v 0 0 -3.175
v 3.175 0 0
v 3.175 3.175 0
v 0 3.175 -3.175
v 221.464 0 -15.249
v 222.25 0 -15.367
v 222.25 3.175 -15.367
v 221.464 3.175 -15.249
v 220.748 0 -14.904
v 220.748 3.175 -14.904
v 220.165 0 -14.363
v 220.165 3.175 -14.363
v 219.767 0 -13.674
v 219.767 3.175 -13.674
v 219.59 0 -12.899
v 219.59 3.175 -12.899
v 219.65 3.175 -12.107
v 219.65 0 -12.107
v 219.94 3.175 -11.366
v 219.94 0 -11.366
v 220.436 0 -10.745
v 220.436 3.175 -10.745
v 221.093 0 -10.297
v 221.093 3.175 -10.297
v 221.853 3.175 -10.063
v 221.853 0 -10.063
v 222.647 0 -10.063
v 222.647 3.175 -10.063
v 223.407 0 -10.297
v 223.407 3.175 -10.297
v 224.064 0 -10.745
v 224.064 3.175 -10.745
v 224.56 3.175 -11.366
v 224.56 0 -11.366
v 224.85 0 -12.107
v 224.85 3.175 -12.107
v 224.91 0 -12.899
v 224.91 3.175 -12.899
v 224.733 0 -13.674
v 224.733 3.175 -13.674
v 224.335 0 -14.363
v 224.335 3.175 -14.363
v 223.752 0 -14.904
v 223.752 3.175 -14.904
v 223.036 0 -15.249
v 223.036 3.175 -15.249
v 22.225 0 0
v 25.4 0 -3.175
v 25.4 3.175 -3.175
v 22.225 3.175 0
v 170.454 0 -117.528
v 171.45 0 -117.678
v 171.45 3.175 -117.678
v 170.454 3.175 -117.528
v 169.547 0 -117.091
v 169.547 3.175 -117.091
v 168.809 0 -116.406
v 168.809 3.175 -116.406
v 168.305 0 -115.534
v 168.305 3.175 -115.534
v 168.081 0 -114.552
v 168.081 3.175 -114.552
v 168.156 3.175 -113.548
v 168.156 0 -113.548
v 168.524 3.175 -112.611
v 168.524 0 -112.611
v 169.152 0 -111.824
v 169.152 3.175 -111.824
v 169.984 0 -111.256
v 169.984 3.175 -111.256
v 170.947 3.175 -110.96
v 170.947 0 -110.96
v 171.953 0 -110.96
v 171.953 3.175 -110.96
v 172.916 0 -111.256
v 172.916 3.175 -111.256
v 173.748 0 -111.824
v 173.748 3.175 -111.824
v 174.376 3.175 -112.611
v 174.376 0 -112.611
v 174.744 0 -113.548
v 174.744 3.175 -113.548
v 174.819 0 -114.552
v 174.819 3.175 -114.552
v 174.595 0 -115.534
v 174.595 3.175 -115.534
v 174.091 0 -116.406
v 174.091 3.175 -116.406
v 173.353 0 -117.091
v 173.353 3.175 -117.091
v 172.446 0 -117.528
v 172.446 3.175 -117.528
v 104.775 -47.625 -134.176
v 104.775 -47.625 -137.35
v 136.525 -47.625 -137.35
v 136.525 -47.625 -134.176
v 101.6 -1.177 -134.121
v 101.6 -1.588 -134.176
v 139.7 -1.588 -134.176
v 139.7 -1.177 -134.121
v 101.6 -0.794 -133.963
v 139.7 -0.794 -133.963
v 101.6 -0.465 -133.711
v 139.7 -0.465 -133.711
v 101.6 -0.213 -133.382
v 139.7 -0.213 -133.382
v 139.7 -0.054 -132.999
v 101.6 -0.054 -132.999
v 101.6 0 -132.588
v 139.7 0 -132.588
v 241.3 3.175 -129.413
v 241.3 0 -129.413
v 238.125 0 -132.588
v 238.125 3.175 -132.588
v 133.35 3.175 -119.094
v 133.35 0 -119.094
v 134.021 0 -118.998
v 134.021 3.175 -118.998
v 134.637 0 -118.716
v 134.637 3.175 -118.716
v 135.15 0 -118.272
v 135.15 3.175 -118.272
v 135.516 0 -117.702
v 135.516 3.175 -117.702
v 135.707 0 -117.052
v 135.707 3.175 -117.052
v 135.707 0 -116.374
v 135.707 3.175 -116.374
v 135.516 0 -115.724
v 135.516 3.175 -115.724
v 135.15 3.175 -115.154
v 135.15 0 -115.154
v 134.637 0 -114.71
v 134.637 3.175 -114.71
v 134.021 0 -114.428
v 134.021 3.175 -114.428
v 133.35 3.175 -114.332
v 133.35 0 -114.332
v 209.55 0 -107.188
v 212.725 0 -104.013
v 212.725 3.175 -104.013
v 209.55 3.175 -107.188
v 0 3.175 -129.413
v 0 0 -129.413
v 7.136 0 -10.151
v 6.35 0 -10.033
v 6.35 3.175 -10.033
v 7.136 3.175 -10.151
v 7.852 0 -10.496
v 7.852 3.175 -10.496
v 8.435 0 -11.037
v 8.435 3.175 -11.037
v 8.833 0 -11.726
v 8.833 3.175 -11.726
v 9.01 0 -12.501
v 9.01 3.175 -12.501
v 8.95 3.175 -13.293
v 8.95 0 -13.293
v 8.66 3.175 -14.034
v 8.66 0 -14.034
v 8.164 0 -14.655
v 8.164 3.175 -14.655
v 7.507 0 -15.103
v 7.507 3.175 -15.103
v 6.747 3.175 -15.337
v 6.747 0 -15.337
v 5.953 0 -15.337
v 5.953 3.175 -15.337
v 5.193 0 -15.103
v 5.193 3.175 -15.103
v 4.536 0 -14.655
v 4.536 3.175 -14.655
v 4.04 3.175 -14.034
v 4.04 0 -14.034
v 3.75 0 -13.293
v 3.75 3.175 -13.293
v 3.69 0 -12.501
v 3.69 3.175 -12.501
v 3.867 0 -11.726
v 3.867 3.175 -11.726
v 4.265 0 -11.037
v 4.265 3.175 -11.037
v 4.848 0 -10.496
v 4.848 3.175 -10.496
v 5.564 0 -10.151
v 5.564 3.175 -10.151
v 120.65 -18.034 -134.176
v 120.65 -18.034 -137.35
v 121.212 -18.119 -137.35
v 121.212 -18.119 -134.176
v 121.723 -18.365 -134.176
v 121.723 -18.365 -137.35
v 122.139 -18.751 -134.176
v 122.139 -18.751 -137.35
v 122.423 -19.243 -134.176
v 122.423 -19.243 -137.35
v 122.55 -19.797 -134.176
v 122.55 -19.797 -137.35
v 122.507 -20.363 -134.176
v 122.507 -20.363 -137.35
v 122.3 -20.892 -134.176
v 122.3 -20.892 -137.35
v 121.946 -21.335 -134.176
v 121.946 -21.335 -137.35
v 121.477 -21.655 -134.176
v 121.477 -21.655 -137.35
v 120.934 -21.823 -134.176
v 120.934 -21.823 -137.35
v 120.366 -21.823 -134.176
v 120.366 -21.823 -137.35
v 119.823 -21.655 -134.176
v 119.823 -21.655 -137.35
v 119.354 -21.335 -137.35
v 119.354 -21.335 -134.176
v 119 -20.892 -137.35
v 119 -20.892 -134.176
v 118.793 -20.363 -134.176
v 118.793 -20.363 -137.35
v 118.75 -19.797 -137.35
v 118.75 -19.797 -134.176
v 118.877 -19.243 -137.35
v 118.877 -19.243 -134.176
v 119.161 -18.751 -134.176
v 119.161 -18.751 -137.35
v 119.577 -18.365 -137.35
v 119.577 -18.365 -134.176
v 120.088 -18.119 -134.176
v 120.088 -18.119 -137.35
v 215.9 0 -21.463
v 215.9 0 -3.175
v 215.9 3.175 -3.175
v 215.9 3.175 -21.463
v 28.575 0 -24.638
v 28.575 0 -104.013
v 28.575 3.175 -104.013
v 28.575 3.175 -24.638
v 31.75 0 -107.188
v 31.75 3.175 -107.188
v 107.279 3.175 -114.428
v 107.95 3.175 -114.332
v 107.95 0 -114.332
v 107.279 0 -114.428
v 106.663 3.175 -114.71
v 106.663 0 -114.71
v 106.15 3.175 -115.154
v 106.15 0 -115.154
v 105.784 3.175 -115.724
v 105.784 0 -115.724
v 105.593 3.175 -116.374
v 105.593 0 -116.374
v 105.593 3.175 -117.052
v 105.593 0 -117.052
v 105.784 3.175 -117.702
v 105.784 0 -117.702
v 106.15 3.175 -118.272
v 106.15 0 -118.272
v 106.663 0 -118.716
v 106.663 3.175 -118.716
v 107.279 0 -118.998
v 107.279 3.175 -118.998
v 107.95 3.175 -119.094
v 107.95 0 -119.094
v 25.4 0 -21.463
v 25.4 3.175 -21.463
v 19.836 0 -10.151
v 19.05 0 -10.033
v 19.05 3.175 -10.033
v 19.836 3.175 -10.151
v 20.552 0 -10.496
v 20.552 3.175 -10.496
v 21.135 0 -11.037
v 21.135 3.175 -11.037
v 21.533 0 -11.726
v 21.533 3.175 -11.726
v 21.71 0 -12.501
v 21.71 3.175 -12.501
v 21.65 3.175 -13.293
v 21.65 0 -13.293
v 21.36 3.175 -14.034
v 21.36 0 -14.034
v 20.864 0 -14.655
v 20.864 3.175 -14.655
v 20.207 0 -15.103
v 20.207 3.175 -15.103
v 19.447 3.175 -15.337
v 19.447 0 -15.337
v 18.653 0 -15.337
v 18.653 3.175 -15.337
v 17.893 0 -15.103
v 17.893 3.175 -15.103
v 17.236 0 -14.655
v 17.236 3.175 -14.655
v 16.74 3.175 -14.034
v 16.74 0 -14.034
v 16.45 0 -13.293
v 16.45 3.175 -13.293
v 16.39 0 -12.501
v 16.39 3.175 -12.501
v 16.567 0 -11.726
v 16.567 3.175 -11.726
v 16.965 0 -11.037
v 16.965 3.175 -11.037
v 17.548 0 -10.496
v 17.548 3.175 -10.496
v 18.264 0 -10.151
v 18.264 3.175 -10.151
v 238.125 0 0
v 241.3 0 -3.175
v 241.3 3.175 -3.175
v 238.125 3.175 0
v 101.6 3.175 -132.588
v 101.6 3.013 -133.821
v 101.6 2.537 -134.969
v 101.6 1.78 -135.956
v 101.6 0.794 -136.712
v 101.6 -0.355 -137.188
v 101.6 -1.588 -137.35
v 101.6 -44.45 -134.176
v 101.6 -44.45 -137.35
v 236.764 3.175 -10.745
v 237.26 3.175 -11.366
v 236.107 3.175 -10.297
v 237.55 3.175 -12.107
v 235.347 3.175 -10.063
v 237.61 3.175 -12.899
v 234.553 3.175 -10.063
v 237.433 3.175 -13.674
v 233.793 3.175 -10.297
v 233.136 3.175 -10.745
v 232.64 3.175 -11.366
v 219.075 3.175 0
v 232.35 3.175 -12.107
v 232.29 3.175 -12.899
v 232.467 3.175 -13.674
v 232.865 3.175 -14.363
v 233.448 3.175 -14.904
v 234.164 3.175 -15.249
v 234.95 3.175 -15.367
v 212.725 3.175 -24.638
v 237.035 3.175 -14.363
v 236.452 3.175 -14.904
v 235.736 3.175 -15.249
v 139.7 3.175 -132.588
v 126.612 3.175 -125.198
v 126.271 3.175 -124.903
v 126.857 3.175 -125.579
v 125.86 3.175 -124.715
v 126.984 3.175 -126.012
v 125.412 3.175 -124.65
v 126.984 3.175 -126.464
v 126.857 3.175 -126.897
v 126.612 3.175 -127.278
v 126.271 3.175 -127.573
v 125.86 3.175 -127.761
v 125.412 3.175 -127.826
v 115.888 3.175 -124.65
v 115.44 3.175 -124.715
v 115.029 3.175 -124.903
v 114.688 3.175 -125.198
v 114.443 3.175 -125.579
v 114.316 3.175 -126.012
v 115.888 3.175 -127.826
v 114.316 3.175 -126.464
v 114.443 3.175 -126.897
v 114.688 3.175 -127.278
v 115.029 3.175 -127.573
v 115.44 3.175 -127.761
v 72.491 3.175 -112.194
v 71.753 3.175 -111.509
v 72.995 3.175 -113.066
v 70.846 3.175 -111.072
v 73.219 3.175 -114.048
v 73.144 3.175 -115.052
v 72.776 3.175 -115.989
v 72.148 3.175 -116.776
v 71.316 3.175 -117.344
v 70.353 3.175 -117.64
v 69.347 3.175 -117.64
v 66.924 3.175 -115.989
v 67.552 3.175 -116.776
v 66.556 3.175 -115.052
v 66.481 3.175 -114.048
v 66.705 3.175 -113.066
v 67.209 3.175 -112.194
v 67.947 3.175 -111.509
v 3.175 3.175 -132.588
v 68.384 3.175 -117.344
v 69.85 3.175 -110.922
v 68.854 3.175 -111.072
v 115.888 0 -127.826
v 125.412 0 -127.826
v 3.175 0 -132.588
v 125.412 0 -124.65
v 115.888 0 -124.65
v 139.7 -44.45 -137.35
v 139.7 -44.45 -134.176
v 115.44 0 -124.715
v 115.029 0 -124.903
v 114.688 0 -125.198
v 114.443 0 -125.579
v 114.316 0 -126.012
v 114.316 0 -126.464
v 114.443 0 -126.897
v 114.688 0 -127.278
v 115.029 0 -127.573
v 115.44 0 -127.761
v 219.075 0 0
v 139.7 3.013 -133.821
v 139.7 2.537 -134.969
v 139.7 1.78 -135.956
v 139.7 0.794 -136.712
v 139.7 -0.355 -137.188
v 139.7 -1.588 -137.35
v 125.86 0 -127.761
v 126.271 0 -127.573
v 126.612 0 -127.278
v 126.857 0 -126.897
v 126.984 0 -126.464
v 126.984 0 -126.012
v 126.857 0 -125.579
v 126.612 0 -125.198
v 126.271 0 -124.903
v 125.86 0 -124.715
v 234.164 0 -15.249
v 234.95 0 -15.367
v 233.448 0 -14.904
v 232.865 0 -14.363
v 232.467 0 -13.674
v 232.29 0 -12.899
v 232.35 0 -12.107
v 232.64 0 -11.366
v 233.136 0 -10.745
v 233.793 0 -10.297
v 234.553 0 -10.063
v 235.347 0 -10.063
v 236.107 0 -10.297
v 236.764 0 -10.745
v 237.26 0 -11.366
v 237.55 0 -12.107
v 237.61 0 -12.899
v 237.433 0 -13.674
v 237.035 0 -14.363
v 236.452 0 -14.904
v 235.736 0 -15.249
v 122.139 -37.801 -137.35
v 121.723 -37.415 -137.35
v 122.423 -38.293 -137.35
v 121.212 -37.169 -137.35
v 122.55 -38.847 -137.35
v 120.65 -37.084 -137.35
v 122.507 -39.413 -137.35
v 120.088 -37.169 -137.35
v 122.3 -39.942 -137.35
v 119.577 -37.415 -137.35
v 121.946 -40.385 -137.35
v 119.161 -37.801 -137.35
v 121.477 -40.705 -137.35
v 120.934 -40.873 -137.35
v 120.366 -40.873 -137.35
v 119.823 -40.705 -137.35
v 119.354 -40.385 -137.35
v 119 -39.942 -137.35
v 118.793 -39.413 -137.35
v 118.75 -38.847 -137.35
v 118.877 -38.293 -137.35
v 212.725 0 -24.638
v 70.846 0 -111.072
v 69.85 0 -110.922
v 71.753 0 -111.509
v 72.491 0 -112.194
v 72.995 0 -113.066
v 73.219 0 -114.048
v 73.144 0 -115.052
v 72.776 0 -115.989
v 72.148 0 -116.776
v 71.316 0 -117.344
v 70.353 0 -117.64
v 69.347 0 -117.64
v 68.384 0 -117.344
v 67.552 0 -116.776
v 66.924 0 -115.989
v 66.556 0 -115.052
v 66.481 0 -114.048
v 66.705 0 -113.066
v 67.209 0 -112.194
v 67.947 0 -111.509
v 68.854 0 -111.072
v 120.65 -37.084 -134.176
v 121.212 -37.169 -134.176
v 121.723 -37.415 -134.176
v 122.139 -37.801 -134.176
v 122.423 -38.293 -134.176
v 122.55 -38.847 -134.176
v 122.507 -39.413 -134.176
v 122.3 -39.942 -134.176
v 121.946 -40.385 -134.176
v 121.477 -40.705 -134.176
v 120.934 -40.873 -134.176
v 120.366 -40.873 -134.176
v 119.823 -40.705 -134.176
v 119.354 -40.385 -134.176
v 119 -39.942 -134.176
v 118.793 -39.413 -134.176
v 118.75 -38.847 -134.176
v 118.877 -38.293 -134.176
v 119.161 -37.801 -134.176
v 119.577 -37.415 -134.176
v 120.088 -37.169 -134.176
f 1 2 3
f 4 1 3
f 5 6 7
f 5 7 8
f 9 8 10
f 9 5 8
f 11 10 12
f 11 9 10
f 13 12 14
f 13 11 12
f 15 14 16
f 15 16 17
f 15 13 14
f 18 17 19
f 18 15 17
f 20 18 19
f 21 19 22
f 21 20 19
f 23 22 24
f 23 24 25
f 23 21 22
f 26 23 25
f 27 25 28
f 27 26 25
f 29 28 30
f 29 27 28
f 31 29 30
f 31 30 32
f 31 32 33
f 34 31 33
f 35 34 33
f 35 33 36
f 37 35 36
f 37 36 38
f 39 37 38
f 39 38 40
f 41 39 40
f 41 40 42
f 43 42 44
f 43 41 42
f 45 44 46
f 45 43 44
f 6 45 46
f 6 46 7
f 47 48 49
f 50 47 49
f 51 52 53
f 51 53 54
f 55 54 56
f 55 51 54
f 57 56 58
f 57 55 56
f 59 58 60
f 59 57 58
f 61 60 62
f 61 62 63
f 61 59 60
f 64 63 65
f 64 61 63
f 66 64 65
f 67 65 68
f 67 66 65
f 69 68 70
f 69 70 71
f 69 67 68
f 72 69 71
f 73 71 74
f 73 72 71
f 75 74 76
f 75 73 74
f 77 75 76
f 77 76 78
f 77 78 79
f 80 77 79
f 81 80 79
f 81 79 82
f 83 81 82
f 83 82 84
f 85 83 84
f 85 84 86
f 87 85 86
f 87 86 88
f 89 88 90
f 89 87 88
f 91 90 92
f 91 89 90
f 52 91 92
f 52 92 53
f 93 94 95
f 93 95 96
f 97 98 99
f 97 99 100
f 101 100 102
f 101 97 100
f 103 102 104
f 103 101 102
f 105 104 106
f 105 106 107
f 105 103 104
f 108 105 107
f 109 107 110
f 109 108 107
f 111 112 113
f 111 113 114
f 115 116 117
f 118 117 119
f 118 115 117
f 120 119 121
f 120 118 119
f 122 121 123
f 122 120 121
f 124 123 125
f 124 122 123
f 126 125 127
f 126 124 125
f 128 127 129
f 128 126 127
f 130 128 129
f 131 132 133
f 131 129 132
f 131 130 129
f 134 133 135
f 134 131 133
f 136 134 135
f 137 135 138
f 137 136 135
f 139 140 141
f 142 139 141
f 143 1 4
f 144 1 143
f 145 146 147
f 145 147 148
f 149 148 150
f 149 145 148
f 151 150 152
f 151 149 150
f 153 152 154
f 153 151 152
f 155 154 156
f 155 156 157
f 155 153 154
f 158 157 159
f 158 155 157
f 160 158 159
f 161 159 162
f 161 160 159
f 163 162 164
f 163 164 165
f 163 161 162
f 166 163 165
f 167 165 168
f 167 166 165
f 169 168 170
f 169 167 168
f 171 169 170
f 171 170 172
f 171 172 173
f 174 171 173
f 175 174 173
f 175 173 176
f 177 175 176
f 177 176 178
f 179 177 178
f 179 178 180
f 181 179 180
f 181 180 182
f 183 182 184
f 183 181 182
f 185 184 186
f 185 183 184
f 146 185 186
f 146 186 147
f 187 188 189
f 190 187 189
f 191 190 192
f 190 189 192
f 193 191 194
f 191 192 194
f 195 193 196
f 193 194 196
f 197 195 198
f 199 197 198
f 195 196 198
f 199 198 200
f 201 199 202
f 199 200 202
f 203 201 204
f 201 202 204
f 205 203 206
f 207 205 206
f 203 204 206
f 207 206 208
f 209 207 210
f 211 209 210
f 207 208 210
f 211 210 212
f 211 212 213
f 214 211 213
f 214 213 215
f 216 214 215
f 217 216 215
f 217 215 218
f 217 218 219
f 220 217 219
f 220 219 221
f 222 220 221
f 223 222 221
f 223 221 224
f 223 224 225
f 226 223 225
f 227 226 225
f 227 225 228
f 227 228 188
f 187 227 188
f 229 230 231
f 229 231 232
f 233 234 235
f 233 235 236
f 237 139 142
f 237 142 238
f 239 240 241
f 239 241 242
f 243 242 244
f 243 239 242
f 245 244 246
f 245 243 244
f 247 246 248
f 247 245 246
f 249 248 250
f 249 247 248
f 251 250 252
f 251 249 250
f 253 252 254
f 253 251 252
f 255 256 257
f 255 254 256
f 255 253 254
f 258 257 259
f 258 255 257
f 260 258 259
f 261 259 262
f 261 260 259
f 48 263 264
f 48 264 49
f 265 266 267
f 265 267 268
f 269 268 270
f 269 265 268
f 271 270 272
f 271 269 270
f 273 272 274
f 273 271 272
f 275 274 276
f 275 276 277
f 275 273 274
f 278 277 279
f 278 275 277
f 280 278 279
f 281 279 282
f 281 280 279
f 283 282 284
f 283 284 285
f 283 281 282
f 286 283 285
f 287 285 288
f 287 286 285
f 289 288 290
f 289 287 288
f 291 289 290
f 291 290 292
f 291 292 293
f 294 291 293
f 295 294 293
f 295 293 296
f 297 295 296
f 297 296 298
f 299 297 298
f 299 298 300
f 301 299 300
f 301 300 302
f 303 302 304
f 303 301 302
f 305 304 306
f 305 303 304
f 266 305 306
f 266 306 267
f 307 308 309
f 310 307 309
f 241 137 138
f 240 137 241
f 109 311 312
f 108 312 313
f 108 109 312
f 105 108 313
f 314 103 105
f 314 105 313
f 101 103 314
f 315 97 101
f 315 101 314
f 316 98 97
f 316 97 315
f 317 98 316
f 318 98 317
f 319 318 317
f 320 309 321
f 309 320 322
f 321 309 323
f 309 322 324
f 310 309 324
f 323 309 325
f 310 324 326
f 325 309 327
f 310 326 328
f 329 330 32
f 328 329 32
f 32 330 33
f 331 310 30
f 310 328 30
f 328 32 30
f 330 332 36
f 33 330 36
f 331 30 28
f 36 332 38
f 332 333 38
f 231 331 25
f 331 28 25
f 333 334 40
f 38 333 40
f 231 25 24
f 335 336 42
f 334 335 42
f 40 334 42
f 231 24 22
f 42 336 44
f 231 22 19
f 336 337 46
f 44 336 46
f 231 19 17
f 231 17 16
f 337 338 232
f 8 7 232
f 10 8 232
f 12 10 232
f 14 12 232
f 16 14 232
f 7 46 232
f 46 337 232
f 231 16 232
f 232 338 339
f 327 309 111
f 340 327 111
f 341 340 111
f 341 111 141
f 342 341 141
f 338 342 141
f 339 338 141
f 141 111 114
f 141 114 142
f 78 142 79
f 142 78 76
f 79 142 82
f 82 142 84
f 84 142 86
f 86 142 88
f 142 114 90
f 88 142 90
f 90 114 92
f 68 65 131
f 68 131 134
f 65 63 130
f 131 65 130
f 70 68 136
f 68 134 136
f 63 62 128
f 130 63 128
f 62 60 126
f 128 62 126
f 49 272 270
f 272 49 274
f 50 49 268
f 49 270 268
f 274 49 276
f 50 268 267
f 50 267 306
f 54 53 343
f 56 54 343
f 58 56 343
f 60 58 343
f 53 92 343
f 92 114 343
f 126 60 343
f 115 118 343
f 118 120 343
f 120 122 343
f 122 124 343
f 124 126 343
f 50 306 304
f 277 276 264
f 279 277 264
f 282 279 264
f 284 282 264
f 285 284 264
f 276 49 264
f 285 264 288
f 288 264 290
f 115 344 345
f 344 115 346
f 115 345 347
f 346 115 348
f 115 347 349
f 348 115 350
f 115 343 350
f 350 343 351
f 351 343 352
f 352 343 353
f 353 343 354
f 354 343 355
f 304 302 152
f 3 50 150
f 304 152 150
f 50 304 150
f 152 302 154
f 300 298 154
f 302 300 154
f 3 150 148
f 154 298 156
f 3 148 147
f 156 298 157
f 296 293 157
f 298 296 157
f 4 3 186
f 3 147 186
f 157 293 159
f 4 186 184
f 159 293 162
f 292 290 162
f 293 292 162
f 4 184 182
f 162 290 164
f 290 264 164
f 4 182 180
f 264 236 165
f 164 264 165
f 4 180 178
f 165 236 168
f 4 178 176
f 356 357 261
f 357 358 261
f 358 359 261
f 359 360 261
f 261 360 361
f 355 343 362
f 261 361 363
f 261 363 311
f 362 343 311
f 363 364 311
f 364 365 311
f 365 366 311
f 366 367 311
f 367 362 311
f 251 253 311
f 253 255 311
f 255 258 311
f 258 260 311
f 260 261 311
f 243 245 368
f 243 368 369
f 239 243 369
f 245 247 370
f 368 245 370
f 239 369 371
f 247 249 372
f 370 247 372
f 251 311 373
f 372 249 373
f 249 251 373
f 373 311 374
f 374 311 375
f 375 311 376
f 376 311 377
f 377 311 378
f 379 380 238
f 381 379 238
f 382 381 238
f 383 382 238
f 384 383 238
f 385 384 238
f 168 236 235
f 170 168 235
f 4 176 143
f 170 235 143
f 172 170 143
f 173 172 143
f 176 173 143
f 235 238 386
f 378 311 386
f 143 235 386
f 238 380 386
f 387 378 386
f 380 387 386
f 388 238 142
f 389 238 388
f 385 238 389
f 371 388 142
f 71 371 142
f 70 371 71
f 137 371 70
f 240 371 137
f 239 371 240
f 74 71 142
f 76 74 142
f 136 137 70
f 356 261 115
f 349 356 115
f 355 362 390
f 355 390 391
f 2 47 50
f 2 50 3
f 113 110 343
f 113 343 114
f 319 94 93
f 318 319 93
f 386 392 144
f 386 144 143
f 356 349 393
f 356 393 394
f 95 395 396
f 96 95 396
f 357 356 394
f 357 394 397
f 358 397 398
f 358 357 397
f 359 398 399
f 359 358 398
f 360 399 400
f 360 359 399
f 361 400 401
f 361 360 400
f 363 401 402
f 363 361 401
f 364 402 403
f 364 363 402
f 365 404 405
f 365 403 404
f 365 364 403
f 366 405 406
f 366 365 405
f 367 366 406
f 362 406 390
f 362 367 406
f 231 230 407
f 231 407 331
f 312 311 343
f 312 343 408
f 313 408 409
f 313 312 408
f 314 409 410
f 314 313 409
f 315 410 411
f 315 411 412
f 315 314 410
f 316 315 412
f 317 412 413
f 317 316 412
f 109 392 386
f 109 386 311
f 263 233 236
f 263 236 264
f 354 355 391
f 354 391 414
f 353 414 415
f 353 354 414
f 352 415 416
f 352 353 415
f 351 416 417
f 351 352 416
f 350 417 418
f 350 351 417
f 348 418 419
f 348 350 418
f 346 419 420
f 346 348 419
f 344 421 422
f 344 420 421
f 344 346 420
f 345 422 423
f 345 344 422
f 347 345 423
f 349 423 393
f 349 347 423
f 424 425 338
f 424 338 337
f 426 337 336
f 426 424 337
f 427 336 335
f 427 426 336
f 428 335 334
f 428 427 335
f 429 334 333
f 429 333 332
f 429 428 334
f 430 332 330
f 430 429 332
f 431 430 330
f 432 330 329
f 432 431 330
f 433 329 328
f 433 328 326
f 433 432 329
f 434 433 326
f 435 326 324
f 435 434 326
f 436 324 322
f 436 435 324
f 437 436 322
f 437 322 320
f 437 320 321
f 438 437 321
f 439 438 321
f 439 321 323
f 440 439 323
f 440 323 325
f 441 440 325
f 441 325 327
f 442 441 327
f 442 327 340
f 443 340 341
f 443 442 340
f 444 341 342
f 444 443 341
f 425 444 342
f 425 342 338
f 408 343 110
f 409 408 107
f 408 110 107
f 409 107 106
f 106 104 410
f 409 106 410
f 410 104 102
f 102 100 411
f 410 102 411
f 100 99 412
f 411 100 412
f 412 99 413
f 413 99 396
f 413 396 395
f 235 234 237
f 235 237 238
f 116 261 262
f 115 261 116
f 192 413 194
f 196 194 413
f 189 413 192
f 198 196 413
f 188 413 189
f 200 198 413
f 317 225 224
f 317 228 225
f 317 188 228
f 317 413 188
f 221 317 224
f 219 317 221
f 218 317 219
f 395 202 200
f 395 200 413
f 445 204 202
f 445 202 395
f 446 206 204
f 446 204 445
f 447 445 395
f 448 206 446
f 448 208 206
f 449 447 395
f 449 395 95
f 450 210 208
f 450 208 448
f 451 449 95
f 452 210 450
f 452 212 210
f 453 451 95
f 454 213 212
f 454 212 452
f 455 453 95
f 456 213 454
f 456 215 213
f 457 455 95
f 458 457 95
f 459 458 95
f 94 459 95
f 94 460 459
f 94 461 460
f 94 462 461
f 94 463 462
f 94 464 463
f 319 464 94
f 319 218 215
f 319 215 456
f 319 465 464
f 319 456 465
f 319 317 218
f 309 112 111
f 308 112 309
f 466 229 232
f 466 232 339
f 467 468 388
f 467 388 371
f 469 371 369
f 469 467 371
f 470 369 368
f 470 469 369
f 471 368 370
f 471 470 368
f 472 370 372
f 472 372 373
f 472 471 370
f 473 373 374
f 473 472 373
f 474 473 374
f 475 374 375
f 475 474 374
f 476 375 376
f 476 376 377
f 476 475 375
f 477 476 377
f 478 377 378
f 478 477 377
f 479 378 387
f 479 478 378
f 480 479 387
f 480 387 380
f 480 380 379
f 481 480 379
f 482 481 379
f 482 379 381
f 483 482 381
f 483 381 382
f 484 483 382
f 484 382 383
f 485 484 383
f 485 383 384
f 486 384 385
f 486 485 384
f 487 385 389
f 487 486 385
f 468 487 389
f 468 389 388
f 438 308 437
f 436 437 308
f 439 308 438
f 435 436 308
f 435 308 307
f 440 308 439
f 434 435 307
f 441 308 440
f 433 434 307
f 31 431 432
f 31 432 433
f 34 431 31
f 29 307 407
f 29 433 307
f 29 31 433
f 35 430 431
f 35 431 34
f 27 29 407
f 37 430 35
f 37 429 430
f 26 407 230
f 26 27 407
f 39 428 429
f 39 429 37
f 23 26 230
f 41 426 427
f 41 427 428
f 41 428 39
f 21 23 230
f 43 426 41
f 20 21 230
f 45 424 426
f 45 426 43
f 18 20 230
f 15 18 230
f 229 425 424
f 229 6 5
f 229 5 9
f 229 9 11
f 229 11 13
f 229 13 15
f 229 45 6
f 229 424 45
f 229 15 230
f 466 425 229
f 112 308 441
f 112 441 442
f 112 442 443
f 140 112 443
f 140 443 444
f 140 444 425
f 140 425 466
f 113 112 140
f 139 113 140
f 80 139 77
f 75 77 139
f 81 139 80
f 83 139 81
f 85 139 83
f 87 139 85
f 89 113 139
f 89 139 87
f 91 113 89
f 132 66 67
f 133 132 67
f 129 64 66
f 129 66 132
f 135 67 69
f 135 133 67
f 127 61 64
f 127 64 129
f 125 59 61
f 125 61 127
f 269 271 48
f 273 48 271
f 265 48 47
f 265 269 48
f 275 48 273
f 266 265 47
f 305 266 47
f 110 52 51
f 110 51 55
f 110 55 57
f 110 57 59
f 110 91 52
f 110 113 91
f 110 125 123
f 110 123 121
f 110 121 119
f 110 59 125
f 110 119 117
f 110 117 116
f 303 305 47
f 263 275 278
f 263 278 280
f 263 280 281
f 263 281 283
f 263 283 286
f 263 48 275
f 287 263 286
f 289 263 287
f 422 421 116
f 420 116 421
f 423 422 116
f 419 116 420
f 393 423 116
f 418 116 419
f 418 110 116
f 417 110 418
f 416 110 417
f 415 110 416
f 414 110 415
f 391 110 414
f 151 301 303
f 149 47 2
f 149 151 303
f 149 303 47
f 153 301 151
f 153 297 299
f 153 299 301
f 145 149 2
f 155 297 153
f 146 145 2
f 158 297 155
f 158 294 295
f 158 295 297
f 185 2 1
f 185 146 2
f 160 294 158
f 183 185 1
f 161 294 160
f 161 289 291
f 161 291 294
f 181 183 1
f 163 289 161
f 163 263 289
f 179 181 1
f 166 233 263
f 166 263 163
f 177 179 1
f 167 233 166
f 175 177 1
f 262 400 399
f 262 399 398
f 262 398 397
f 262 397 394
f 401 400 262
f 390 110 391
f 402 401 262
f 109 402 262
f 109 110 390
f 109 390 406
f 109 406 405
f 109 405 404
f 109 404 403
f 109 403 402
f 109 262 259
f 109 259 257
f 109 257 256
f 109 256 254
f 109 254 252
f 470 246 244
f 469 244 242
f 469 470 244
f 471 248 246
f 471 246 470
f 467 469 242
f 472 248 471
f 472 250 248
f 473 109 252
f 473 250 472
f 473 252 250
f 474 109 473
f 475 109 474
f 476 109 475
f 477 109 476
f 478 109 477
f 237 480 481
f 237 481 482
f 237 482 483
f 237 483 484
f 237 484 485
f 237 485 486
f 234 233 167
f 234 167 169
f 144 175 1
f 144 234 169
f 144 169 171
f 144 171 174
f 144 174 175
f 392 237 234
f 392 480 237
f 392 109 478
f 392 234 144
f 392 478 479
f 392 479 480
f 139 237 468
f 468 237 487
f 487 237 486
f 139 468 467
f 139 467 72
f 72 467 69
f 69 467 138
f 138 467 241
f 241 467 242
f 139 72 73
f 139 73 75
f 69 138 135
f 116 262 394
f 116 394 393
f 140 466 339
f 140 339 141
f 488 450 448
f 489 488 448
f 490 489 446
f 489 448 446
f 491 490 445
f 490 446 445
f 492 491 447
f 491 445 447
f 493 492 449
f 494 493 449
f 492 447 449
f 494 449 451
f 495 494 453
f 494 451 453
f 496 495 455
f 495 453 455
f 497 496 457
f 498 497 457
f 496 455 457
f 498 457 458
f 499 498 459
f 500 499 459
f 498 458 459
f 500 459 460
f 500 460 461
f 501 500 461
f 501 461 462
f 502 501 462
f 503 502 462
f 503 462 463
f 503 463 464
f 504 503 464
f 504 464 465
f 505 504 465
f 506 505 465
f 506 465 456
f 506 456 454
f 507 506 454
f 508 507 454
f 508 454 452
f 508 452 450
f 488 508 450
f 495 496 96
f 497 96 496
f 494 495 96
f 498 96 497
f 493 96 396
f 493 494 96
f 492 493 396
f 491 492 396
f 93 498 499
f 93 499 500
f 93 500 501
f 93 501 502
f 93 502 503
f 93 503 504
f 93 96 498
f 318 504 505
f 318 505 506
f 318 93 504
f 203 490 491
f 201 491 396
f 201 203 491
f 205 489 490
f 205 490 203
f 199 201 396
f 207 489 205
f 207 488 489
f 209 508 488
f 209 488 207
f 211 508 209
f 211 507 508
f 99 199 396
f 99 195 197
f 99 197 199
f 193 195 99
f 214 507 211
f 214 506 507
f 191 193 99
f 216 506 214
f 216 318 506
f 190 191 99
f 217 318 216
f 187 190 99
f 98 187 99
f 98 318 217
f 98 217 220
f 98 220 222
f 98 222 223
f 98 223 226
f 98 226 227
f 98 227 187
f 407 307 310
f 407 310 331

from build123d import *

# Parameters (mm, degrees)
SKETCH1_R          = 2.667
SKETCH1_R_2        = 3.3782
BASE_FLANGE1_DEPTH = 3.175
CHAMFER2_SIZE      = 3.175
EDGE_FLANGE1_DEPTH = 38.1
CHAMFER3_SIZE      = 3.175
SKETCH9_R          = 1.905
CUT_EXTRUDE1_DEPTH = 282.707277995
CUT_EXTRUDE2_DEPTH = 283.261385688
CUT_EXTRUDE3_DEPTH = 283.261385688


# Sheet-metal steps are written as plain solids
with BuildPart() as part:
    # Sketch1 → Base-Flange1 (new body)
    with BuildSketch(Plane(origin=(0, 0, 0), x_dir=(1, 0, 0), z_dir=(0, 1, 0))):
        Polygon((25.4, 0), (0, 0), (0, 132.588), (241.3, 132.588), (241.3, 0), (215.9, 0), (215.9, 21.463), (212.725, 24.638), (212.725, 107.188), (28.575, 107.188), (28.575, 24.638), (25.4, 21.463), align=None)
        with Locations(Location((6.35, 12.7, 0), (0, 0, 270))):
            Circle(SKETCH1_R, mode=Mode.SUBTRACT)
        with Locations(Location((19.05, 12.7, 0), (0, 0, 270))):
            Circle(SKETCH1_R, mode=Mode.SUBTRACT)
        with Locations(Location((222.25, 12.7, 0), (0, 0, 90))):
            Circle(SKETCH1_R, mode=Mode.SUBTRACT)
        with Locations(Location((234.95, 12.7, 0), (0, 0, 90))):
            Circle(SKETCH1_R, mode=Mode.SUBTRACT)
        with Locations(Location((69.85, 114.3, 0), (0, 0, 270))):
            Circle(SKETCH1_R_2, mode=Mode.SUBTRACT)
        with Locations(Location((171.45, 114.3, 0), (0, 0, 90))):
            Circle(SKETCH1_R_2, mode=Mode.SUBTRACT)
    extrude(amount=BASE_FLANGE1_DEPTH)

    # Chamfer2
    chamfer2_edges = [part.edges().sort_by_distance(p)[0] for p in [
        (0, 1.5875, -132.588),
        (241.3, 1.5875, -132.588),
        (241.3, 1.5875, 0),
        (215.9, 1.5875, 0),
        (212.725, 1.5875, -107.188),
        (28.575, 1.5875, -107.188),
        (25.4, 1.5875, 0),
        (0, 1.5875, 0),
    ]]
    chamfer(chamfer2_edges, length=CHAMFER2_SIZE)

    # Edge-Flange1 section (across the edge) → Edge-Flange1 (add)
    with BuildSketch(Plane(origin=(101.6, 0, -134.1755), x_dir=(0, 0, 1), z_dir=(1, 0, 0))):
        with BuildLine():
            Line((-3.175, 1.5875), (-3.175, 47.625))
            Line((-3.175, 47.625), (0, 47.625))
            Line((0, 47.625), (0, 1.5875))
            ThreePointArc((0, 1.5875), (0.464967985, 0.464967985), (1.5875, 0))
            Line((1.5875, 0), (1.5875, -3.175))
            ThreePointArc((1.5875, -3.175), (-1.780096045, -1.780096045), (-3.175, 1.5875))
        make_face()
    extrude(amount=EDGE_FLANGE1_DEPTH)

    # Chamfer3
    chamfer3_edges = [part.edges().sort_by_distance(p)[0] for p in [
        (101.6, -47.625, -135.763),
        (139.7, -47.625, -135.763),
    ]]
    chamfer(chamfer3_edges, length=CHAMFER3_SIZE)

    # Sketch9 → Cut-Extrude1 (cut, through all)
    with BuildSketch(Plane(origin=(0, 0, -137.3505), x_dir=(-1, 0, 0), z_dir=(0, 0, -1))):
        with Locations(Location((-120.65, -38.989, 0), (0, 0, 90))):
            Circle(SKETCH9_R)
        with Locations(Location((-120.65, -19.939, 0), (0, 0, 90))):
            Circle(SKETCH9_R)
    extrude(amount=-CUT_EXTRUDE1_DEPTH, mode=Mode.SUBTRACT)

    # Sketch10 → Cut-Extrude2 (cut, through all)
    with BuildSketch(Plane(origin=(0, 3.175, 0), x_dir=(1, 0, 0), z_dir=(0, 1, 0))):
        with BuildLine():
            Line((115.8875, 127.8255), (125.4125, 127.8255))
            ThreePointArc((125.4125, 127.8255), (127, 126.238), (125.4125, 124.6505))
            Line((125.4125, 124.6505), (115.8875, 124.6505))
            ThreePointArc((115.8875, 124.6505), (114.3, 126.238), (115.8875, 127.8255))
        make_face()
    extrude(amount=-CUT_EXTRUDE2_DEPTH, mode=Mode.SUBTRACT)

    # Sketch11 → Cut-Extrude3 (cut, through all)
    with BuildSketch(Plane(origin=(0, 3.175, 0), x_dir=(1, 0, 0), z_dir=(0, 1, 0))):
        with BuildLine():
            Line((107.95, 119.09425), (133.35, 119.09425))
            ThreePointArc((133.35, 119.09425), (135.73125, 116.713), (133.35, 114.33175))
            Line((133.35, 114.33175), (107.95, 114.33175))
            ThreePointArc((107.95, 114.33175), (105.56875, 116.713), (107.95, 119.09425))
        make_face()
    extrude(amount=-CUT_EXTRUDE3_DEPTH, mode=Mode.SUBTRACT)


solid = part.part
